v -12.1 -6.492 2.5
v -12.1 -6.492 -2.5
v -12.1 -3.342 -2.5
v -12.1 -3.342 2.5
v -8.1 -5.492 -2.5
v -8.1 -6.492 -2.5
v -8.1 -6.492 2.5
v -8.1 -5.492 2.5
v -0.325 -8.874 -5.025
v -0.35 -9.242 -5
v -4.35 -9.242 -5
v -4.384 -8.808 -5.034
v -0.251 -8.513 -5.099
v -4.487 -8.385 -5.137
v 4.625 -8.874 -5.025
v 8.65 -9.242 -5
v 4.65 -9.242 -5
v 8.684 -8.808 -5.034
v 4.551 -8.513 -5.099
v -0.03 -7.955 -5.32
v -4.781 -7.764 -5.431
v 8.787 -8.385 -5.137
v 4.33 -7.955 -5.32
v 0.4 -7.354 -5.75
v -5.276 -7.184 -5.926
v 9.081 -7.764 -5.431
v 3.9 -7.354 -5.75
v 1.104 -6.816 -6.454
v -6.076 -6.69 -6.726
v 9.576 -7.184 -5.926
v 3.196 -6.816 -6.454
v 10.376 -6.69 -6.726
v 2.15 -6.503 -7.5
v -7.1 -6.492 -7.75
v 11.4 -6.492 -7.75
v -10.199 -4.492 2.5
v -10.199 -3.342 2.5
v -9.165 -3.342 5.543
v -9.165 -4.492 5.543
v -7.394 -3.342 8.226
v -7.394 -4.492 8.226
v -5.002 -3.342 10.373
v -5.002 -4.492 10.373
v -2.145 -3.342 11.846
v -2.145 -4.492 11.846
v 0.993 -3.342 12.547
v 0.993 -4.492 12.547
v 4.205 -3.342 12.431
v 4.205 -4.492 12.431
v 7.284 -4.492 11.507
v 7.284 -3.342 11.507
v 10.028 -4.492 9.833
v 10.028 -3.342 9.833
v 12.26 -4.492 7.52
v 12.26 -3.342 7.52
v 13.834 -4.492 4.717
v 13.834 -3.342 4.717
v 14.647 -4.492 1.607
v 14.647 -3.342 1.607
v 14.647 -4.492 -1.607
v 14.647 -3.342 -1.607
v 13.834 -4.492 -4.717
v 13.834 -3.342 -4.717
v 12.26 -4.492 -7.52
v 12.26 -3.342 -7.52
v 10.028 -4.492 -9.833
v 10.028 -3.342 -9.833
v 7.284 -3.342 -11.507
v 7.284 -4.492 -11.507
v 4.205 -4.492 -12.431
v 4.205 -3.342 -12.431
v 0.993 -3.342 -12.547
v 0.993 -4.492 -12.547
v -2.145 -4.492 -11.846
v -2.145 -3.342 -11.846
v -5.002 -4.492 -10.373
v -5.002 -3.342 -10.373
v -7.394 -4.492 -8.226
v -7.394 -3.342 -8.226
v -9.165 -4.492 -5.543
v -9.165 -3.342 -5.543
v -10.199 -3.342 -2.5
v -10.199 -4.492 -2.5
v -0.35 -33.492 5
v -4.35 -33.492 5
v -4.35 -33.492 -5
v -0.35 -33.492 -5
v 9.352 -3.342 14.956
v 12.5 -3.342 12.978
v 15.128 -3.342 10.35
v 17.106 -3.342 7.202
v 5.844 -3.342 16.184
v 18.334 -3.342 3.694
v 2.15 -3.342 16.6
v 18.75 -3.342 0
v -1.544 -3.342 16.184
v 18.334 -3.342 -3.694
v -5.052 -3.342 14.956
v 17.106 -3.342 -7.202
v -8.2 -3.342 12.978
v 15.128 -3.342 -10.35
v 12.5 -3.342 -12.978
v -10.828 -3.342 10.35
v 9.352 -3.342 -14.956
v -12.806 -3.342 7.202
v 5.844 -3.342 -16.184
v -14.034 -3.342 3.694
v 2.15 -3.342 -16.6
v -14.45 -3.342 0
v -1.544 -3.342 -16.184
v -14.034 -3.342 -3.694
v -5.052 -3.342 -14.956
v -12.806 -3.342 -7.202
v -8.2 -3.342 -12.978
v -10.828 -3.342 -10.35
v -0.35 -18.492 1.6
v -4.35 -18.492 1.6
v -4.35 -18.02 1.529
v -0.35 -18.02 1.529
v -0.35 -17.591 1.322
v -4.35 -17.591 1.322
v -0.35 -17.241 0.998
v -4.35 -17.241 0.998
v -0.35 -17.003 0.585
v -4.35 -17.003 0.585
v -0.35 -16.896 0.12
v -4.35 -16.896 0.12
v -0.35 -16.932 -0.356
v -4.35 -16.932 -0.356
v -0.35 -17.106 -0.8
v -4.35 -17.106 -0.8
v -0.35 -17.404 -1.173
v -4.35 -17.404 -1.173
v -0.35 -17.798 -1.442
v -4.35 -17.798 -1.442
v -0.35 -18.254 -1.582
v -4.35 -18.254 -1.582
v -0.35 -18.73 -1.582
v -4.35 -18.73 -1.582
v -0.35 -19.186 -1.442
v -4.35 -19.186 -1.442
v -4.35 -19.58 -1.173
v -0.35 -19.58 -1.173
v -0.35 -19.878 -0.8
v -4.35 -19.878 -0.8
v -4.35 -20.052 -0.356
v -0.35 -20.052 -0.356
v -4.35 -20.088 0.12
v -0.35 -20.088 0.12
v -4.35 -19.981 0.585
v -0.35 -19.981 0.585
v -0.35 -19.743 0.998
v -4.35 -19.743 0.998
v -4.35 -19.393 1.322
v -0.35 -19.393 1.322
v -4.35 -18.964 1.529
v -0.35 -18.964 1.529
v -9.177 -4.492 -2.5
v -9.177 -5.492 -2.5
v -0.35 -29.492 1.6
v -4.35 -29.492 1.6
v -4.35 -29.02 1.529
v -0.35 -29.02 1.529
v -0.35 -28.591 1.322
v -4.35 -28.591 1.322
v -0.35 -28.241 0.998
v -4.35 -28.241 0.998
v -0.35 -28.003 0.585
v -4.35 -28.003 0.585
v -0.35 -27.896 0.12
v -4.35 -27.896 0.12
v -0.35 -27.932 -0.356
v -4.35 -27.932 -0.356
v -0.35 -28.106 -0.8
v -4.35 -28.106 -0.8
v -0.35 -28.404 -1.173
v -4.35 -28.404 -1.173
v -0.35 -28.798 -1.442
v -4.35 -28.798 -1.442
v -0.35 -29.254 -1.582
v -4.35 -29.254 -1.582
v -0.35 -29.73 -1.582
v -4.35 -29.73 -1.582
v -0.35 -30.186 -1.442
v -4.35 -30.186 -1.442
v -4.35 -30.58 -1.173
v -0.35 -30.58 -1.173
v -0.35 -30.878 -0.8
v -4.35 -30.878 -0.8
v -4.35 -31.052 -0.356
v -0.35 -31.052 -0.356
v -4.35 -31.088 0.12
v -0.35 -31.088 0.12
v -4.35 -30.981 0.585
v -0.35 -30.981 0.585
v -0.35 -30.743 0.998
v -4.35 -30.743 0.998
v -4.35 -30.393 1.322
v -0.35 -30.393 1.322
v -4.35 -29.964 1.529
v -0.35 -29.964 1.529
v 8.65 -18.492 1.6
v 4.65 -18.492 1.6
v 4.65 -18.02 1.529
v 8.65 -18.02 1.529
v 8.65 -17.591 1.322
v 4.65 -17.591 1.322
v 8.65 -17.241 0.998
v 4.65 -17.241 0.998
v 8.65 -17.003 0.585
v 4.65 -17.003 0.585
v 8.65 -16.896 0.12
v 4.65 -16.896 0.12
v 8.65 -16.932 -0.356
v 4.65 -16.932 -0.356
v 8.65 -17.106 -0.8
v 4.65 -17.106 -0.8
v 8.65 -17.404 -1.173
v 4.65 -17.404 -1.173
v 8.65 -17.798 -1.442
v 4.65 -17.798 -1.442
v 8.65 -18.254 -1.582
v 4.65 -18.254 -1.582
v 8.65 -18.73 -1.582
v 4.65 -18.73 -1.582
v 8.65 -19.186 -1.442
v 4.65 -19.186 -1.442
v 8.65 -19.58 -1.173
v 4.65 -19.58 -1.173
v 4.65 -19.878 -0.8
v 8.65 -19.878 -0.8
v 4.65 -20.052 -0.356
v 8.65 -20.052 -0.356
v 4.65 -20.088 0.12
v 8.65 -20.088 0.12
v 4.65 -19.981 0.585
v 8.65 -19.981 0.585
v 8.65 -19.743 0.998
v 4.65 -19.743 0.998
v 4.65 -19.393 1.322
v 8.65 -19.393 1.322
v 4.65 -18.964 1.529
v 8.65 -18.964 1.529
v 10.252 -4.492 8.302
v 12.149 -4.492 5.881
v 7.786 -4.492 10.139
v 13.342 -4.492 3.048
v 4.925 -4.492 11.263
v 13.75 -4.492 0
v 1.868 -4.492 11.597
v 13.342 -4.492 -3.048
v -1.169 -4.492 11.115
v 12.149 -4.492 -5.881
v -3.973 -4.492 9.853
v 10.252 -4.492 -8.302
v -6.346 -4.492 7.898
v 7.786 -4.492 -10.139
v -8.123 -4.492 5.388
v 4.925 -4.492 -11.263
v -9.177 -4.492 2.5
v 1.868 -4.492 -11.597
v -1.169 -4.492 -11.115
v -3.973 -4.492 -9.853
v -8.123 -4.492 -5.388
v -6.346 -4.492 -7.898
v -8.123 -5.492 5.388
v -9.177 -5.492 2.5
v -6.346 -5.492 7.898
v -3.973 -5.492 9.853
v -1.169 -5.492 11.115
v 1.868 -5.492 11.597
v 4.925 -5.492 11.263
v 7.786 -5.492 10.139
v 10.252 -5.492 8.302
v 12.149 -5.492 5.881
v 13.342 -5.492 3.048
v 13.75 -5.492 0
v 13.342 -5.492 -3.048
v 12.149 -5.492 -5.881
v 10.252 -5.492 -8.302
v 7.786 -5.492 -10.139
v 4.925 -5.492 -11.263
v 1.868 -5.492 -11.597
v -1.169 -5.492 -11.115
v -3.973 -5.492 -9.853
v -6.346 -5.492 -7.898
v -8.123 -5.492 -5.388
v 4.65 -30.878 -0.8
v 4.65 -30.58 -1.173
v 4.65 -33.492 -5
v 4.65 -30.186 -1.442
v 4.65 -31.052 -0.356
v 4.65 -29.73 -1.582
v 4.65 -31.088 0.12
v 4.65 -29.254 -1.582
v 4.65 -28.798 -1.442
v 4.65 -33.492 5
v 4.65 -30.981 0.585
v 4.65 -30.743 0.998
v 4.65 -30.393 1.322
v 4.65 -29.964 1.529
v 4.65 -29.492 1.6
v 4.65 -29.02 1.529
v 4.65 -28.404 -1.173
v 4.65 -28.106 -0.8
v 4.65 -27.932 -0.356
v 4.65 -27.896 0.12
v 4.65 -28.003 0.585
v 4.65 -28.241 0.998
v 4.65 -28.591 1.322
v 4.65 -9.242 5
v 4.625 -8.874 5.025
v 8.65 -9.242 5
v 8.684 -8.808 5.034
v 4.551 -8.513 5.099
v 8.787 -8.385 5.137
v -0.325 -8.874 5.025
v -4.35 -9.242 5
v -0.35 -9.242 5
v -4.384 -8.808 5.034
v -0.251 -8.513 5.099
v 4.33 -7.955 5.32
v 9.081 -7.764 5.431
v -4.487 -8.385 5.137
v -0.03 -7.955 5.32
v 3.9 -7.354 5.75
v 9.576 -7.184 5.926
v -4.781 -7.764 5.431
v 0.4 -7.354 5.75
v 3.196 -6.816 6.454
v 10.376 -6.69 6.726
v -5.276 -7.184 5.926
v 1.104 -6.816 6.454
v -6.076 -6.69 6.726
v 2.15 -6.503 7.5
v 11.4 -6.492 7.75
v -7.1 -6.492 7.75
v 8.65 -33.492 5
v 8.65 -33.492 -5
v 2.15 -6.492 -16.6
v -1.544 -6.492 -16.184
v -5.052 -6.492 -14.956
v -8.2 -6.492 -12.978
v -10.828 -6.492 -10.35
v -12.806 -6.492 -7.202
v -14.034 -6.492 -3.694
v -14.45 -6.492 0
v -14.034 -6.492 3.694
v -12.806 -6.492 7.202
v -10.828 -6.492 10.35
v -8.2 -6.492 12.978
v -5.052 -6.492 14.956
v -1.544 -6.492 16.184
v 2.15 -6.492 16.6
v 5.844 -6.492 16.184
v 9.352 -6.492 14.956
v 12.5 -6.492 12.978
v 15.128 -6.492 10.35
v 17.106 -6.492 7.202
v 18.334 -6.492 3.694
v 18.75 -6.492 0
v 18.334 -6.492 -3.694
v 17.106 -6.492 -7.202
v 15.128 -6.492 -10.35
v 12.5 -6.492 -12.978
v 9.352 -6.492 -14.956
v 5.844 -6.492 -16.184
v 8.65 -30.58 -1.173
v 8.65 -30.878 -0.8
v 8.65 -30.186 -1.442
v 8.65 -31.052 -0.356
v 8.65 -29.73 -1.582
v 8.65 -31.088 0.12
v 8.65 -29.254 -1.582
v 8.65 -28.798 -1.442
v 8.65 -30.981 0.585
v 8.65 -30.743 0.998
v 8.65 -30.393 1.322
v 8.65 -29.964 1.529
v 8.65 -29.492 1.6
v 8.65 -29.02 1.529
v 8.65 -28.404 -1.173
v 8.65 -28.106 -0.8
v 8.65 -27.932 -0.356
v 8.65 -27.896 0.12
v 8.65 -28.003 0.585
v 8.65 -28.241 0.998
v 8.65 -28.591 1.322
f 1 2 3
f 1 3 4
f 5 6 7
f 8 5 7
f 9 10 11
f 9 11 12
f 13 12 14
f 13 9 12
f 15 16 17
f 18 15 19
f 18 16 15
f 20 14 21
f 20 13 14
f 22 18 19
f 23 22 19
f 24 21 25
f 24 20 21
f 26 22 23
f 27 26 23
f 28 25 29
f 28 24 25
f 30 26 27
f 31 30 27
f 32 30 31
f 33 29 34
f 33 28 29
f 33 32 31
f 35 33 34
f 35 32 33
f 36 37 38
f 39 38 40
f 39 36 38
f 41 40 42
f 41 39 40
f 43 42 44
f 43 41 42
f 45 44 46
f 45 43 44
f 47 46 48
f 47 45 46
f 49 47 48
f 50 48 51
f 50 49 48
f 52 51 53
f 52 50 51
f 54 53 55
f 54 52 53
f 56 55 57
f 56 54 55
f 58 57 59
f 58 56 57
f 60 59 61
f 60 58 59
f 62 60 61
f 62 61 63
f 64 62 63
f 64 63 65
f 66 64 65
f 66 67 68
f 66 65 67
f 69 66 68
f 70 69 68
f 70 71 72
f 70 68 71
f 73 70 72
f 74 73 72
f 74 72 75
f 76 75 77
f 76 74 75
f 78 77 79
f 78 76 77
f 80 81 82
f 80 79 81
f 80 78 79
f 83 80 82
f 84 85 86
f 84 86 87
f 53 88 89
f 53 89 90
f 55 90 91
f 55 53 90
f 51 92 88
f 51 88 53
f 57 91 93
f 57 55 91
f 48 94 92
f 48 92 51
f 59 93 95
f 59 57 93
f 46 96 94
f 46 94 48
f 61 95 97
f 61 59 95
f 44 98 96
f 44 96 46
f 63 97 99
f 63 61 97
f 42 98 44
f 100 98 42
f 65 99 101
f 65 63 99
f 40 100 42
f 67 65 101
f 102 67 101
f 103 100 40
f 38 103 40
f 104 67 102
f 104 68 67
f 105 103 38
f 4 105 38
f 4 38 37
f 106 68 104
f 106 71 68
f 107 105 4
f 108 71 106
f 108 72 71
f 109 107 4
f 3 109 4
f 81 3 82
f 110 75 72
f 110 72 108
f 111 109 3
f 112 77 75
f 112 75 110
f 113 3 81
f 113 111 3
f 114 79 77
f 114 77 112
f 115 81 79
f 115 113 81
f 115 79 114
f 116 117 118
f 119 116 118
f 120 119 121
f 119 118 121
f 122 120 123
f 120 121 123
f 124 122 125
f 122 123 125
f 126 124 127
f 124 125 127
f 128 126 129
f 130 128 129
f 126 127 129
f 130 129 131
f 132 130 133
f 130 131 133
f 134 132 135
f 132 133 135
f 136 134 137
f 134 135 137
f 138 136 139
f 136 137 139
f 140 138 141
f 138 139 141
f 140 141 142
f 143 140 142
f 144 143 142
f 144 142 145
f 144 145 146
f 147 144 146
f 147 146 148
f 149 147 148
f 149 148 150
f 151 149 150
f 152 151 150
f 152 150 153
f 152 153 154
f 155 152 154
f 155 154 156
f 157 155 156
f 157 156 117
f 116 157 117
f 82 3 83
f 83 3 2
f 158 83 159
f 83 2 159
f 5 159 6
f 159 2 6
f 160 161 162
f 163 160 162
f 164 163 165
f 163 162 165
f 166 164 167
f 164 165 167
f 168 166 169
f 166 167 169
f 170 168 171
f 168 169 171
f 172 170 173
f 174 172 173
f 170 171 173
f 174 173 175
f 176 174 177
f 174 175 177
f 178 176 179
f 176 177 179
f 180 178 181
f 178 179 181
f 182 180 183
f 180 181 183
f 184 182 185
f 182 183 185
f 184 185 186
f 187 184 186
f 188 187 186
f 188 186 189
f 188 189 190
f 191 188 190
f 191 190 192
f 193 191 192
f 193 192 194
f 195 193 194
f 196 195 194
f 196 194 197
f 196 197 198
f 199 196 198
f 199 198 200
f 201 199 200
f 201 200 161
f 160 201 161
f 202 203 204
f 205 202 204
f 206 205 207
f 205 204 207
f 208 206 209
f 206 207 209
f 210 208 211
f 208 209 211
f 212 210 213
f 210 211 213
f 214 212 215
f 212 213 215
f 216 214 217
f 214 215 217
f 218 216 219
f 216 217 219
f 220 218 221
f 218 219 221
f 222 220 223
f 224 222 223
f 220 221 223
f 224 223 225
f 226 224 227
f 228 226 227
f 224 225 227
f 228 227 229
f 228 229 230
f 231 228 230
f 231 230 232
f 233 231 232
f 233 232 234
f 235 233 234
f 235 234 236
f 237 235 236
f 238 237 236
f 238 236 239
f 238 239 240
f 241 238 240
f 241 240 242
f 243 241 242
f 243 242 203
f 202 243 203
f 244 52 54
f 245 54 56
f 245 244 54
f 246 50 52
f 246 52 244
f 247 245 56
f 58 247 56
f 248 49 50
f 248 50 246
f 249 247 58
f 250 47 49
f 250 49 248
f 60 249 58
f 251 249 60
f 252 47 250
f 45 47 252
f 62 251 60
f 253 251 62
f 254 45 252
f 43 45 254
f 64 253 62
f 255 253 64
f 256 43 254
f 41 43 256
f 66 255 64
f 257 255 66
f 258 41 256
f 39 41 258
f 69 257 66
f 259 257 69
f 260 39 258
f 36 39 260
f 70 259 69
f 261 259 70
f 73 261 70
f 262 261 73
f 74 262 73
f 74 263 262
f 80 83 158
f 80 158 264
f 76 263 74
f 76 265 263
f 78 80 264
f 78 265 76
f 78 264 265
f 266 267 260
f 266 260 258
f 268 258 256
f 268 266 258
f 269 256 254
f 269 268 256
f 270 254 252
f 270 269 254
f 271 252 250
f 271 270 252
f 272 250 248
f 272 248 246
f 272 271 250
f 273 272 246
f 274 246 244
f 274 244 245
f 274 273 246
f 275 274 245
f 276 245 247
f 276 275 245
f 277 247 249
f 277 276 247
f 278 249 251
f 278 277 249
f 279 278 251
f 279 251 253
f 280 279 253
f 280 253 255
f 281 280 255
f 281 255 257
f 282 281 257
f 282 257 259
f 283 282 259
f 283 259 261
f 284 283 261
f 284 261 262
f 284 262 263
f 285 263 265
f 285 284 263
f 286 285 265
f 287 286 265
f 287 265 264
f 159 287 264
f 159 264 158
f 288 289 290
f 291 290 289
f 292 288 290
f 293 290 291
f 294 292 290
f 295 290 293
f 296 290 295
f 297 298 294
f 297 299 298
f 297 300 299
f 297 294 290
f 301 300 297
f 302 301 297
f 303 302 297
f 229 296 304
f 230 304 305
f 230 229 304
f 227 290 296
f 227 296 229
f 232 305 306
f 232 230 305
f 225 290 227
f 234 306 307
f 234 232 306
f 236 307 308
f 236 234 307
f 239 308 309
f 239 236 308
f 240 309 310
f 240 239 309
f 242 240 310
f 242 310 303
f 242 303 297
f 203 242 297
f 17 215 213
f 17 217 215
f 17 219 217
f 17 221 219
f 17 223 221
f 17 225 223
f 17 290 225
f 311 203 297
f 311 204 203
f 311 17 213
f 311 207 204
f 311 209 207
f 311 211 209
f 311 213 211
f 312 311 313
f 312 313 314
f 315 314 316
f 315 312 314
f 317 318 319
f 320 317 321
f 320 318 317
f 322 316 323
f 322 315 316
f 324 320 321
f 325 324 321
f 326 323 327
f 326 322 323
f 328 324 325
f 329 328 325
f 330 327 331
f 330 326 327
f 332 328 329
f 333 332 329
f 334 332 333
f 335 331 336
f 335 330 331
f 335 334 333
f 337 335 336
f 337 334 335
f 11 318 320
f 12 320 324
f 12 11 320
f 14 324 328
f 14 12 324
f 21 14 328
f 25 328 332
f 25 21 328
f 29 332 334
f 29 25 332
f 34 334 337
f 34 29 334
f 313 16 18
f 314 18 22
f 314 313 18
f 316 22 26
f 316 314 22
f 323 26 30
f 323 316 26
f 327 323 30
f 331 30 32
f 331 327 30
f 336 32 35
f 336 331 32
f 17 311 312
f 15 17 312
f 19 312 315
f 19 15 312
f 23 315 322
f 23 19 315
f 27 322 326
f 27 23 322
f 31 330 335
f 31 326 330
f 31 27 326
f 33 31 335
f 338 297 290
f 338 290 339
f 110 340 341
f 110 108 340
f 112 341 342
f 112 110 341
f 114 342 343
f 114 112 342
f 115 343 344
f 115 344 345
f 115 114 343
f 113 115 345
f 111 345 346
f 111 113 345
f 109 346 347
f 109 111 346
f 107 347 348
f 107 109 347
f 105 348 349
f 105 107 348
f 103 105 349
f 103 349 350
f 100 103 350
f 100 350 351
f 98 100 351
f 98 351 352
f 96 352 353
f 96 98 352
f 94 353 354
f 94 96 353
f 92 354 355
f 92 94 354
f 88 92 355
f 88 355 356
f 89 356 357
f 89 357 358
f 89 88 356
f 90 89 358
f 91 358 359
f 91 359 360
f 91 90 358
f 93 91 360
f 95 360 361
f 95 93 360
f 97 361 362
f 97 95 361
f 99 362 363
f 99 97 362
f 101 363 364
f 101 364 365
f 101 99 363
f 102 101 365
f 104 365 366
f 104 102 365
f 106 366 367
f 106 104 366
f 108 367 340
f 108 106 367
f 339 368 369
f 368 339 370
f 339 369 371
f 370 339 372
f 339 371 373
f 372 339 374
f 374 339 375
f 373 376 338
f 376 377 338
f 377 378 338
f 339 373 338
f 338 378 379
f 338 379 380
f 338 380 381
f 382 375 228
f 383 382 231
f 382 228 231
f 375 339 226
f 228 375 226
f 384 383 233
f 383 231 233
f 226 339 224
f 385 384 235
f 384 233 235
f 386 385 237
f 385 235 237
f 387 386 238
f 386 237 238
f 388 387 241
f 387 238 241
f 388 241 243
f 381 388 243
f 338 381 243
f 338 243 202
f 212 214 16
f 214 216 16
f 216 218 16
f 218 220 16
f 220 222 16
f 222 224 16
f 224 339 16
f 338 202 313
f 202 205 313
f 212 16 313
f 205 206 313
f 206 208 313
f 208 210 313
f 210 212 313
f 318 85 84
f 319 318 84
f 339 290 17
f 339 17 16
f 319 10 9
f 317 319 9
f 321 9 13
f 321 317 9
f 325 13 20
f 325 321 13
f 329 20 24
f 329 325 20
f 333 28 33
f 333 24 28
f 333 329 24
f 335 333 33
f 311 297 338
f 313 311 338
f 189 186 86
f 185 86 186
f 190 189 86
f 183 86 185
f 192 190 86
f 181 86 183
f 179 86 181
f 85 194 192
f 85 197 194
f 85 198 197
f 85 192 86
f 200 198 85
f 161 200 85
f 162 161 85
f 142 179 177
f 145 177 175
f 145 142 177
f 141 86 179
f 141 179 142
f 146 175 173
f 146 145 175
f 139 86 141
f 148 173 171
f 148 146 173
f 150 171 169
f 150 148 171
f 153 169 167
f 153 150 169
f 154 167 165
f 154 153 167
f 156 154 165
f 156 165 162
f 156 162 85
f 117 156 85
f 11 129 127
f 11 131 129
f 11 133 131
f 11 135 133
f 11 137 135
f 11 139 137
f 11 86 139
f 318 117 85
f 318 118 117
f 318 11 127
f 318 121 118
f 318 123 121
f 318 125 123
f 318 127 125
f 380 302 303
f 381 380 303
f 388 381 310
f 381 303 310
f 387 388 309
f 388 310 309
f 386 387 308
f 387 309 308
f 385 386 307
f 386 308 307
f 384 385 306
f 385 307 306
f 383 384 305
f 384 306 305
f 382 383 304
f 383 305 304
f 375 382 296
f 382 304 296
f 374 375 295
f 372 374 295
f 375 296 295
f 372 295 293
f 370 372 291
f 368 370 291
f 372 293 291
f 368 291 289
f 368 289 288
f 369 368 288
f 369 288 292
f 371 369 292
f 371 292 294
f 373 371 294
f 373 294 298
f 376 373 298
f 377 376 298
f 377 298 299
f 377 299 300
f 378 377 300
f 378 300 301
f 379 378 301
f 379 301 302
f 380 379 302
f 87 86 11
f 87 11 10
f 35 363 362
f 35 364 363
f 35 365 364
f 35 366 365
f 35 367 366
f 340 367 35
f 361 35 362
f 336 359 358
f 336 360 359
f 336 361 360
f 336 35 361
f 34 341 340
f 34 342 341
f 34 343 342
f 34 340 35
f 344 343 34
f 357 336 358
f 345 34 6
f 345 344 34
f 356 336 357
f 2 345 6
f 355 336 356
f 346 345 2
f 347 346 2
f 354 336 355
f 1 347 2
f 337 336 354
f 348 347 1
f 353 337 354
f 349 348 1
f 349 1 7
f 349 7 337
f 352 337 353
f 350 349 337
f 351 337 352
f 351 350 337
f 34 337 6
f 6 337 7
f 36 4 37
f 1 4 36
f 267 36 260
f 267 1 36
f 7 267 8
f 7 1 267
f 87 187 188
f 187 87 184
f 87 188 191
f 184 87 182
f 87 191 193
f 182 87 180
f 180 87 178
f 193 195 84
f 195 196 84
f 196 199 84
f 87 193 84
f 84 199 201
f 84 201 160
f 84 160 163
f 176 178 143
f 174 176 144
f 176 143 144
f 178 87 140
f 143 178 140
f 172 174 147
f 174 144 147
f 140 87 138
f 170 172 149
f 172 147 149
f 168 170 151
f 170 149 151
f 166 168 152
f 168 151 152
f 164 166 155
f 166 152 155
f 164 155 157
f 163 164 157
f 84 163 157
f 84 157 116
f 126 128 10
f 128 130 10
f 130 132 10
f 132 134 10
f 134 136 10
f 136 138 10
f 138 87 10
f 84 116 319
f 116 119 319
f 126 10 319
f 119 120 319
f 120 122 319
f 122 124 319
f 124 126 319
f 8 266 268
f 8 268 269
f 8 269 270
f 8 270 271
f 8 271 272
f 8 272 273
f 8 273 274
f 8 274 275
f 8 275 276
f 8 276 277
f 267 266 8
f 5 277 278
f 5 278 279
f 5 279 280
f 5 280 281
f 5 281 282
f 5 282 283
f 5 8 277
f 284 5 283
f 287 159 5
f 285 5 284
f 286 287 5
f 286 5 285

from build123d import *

# Parameters (mm, degrees)
SKETCH2_W           = 4
SKETCH2_H           = 10
BOSS_EXTRUDE1_DEPTH = 27
SKETCH3_R           = 1.6
CUT_EXTRUDE1_DEPTH  = 22.3
FILLET1_R           = 2.75
SKETCH6_W           = 4
SKETCH6_H           = 5
CUT_EXTRUDE4_DEPTH  = 10


with BuildPart() as part:
    # Sketch1 → Revolve1 (revolve)
    with BuildSketch(Plane.XY, mode=Mode.PRIVATE) as revolve1_sk:
        Polygon((-14.45, -3.342), (-10.45, -3.342), (-10.45, -4.492), (-9.45, -4.492), (-9.45, -5.492), (2.15, -5.492), (2.15, -6.492), (-14.45, -6.492), align=None)
    revolve(revolve1_sk.sketch.rotate(Axis((2.15, -6.492, 0), (0, 1, 0)), 270), axis=Axis((2.15, -6.492, 0), (0, 1, 0)))

    # Sketch2 → Boss-Extrude1 (add)
    with BuildSketch(Plane.XZ.offset(6.492)):
        with Locations((6.65, 0)):
            Rectangle(SKETCH2_W, SKETCH2_H)
        with Locations((-2.35, 0)):
            Rectangle(SKETCH2_W, SKETCH2_H)
    extrude(amount=BOSS_EXTRUDE1_DEPTH)

    # Sketch3 → Cut-Extrude1 (cut)
    with BuildSketch(Plane.ZY.offset(4.35)):
        with Locations((0, -29.492)):
            Circle(SKETCH3_R)
        with Locations((0, -18.492)):
            Circle(SKETCH3_R)
    extrude(amount=-CUT_EXTRUDE1_DEPTH, mode=Mode.SUBTRACT)

    # Fillet1
    # the kernel refuses this fillet: 2.75 mm, written as the material it adds along each edge
    with BuildSketch(Plane(origin=(-4.35, -6.492, -5), x_dir=(-1, 0, 0), z_dir=(0, 0, 1)), Plane(origin=(-0.35, -6.492, 5), x_dir=(1, 0, 0), z_dir=(0, 0, -1)), Plane(origin=(8.65, -6.492, 5), x_dir=(1, 0, 0), z_dir=(0, 0, -1)), Plane(origin=(4.65, -6.492, -5), x_dir=(-1, 0, 0), z_dir=(0, 0, 1))) as fillet1_piece_1:
        with BuildLine():
            CenterArc((FILLET1_R, FILLET1_R), FILLET1_R, 180, 90)
            Line((0, FILLET1_R), (0, 0))
            Line((0, 0), (FILLET1_R, 0))
        make_face()
    extrude(amount=10)
    with BuildSketch(Plane(origin=(6.525, -6.492, -5), x_dir=(0, 0, -1), z_dir=(-1, 0, 0))) as fillet1_piece_2_section:
        with BuildLine():
            CenterArc((FILLET1_R, FILLET1_R), FILLET1_R, 180, 90)
            Line((0, FILLET1_R), (0, 0))
            Line((0, 0), (FILLET1_R, 0))
        make_face()
    fillet1_piece_2 = extrude(amount=10.875, mode=Mode.PRIVATE)
    fillet1_piece_2 = split(fillet1_piece_2, bisect_by=Plane(origin=(4.65, -7.114586564, -5.622586564), z_dir=(1, 0, 0)), keep=Keep.TOP, mode=Mode.PRIVATE)
    add(fillet1_piece_2)
    with BuildSketch(Plane(origin=(-0.35, -6.492, -5), x_dir=(0, 0, -1), z_dir=(-1, 0, 0)), Plane(origin=(-4.35, -6.492, 5), x_dir=(0, 0, 1), z_dir=(1, 0, 0)), Plane(origin=(4.65, -6.492, 5), x_dir=(0, 0, 1), z_dir=(1, 0, 0)), Plane(origin=(8.65, -6.492, -5), x_dir=(0, 0, -1), z_dir=(-1, 0, 0))) as fillet1_piece_3:
        with BuildLine():
            CenterArc((FILLET1_R, FILLET1_R), FILLET1_R, 180, 90)
            Line((0, FILLET1_R), (0, 0))
            Line((0, 0), (FILLET1_R, 0))
        make_face()
    extrude(amount=4)
    with BuildSketch(Plane(origin=(-4.35, -6.492, 5), x_dir=(0, 0, 1), z_dir=(1, 0, 0))) as fillet1_piece_4_section:
        with BuildLine():
            CenterArc((FILLET1_R, FILLET1_R), FILLET1_R, 180, 90)
            Line((0, FILLET1_R), (0, 0))
            Line((0, 0), (FILLET1_R, 0))
        make_face()
    fillet1_piece_4 = extrude(amount=10.875, mode=Mode.PRIVATE)
    fillet1_piece_4 = split(fillet1_piece_4, bisect_by=Plane(origin=(4.65, -7.114586564, 5.622586564), z_dir=(1, 0, 0)), keep=Keep.TOP, mode=Mode.PRIVATE)
    add(fillet1_piece_4)
    with BuildSketch(Plane(origin=(-2.225, -6.492, 5), x_dir=(0, 0, 1), z_dir=(1, 0, 0))) as fillet1_piece_5_section:
        with BuildLine():
            CenterArc((FILLET1_R, FILLET1_R), FILLET1_R, 180, 90)
            Line((0, FILLET1_R), (0, 0))
            Line((0, 0), (FILLET1_R, 0))
        make_face()
    fillet1_piece_5 = extrude(amount=10.875, mode=Mode.PRIVATE)
    fillet1_piece_5 = split(fillet1_piece_5, bisect_by=Plane(origin=(-0.35, -7.114586564, 5.622586564), z_dir=(-1, 0, 0)), keep=Keep.TOP, mode=Mode.PRIVATE)
    add(fillet1_piece_5)
    with BuildSketch(Plane(origin=(8.65, -6.492, -5), x_dir=(0, 0, -1), z_dir=(-1, 0, 0))) as fillet1_piece_6_section:
        with BuildLine():
            CenterArc((FILLET1_R, FILLET1_R), FILLET1_R, 180, 90)
            Line((0, FILLET1_R), (0, 0))
            Line((0, 0), (FILLET1_R, 0))
        make_face()
    fillet1_piece_6 = extrude(amount=10.875, mode=Mode.PRIVATE)
    fillet1_piece_6 = split(fillet1_piece_6, bisect_by=Plane(origin=(-0.35, -7.114586564, -5.622586564), z_dir=(-1, 0, 0)), keep=Keep.TOP, mode=Mode.PRIVATE)
    add(fillet1_piece_6)
    with BuildSketch(Plane(origin=(-4.35, -6.492, -11.875), x_dir=(-1, 0, 0), z_dir=(0, 0, 1))) as fillet1_piece_7a_section:
        with BuildLine():
            CenterArc((FILLET1_R, FILLET1_R), FILLET1_R, 180, 90)
            Line((0, FILLET1_R), (0, 0))
            Line((0, 0), (FILLET1_R, 0))
        make_face()
    fillet1_piece_7a = extrude(amount=16.875, mode=Mode.PRIVATE)
    fillet1_piece_7a = split(fillet1_piece_7a, bisect_by=Plane(origin=(-4.972586564, -7.114586564, -5), z_dir=(0, 0, -1)), keep=Keep.TOP, mode=Mode.PRIVATE)
    with BuildSketch(Plane(origin=(-0.35, -6.492, -5), x_dir=(0, 0, -1), z_dir=(-1, 0, 0))) as fillet1_piece_7b_section:
        with BuildLine():
            CenterArc((FILLET1_R, FILLET1_R), FILLET1_R, 180, 90)
            Line((0, FILLET1_R), (0, 0))
            Line((0, 0), (FILLET1_R, 0))
        make_face()
    fillet1_piece_7b = extrude(amount=10.875, mode=Mode.PRIVATE)
    fillet1_piece_7b = split(fillet1_piece_7b, bisect_by=Plane(origin=(-4.35, -7.114586564, -5.622586564), z_dir=(-1, 0, 0)), keep=Keep.TOP, mode=Mode.PRIVATE)
    fillet1_piece_7 = fillet1_piece_7a & fillet1_piece_7b
    add(fillet1_piece_7)
    with BuildSketch(Plane(origin=(-4.35, -6.492, -5), x_dir=(-1, 0, 0), z_dir=(0, 0, 1))) as fillet1_piece_8a_section:
        with BuildLine():
            CenterArc((FILLET1_R, FILLET1_R), FILLET1_R, 180, 90)
            Line((0, FILLET1_R), (0, 0))
            Line((0, 0), (FILLET1_R, 0))
        make_face()
    fillet1_piece_8a = extrude(amount=16.875, mode=Mode.PRIVATE)
    fillet1_piece_8a = split(fillet1_piece_8a, bisect_by=Plane(origin=(-4.972586564, -7.114586564, 5), z_dir=(0, 0, 1)), keep=Keep.TOP, mode=Mode.PRIVATE)
    with BuildSketch(Plane(origin=(-11.225, -6.492, 5), x_dir=(0, 0, 1), z_dir=(1, 0, 0))) as fillet1_piece_8b_section:
        with BuildLine():
            CenterArc((FILLET1_R, FILLET1_R), FILLET1_R, 180, 90)
            Line((0, FILLET1_R), (0, 0))
            Line((0, 0), (FILLET1_R, 0))
        make_face()
    fillet1_piece_8b = extrude(amount=10.875, mode=Mode.PRIVATE)
    fillet1_piece_8b = split(fillet1_piece_8b, bisect_by=Plane(origin=(-4.35, -7.114586564, 5.622586564), z_dir=(-1, 0, 0)), keep=Keep.TOP, mode=Mode.PRIVATE)
    fillet1_piece_8 = fillet1_piece_8a & fillet1_piece_8b
    add(fillet1_piece_8)
    with BuildSketch(Plane(origin=(6.525, -6.492, -5), x_dir=(0, 0, -1), z_dir=(-1, 0, 0))) as fillet1_piece_9a_section:
        with BuildLine():
            CenterArc((FILLET1_R, FILLET1_R), FILLET1_R, 180, 90)
            Line((0, FILLET1_R), (0, 0))
            Line((0, 0), (FILLET1_R, 0))
        make_face()
    fillet1_piece_9a = extrude(amount=10.875, mode=Mode.PRIVATE)
    fillet1_piece_9a = split(fillet1_piece_9a, bisect_by=Plane(origin=(4.65, -7.114586564, -5.622586564), z_dir=(-1, 0, 0)), keep=Keep.TOP, mode=Mode.PRIVATE)
    fillet1_piece_9a = split(fillet1_piece_9a, bisect_by=Plane(origin=(-0.35, -7.114586564, -5.622586564), z_dir=(1, 0, 0)), keep=Keep.TOP, mode=Mode.PRIVATE)
    with BuildSketch(Plane(origin=(-0.35, -6.492, 5), x_dir=(1, 0, 0), z_dir=(0, 0, -1))) as fillet1_piece_9b_section:
        with BuildLine():
            CenterArc((FILLET1_R, FILLET1_R), FILLET1_R, 180, 90)
            Line((0, FILLET1_R), (0, 0))
            Line((0, 0), (FILLET1_R, 0))
        make_face()
    fillet1_piece_9b = extrude(amount=16.875, mode=Mode.PRIVATE)
    fillet1_piece_9b = split(fillet1_piece_9b, bisect_by=Plane(origin=(0.272586564, -7.114586564, -5), z_dir=(0, 0, -1)), keep=Keep.TOP, mode=Mode.PRIVATE)
    fillet1_piece_9 = fillet1_piece_9a & fillet1_piece_9b
    add(fillet1_piece_9)
    with BuildSketch(Plane(origin=(-0.35, -6.492, 11.875), x_dir=(1, 0, 0), z_dir=(0, 0, -1))) as fillet1_piece_10a_section:
        with BuildLine():
            CenterArc((FILLET1_R, FILLET1_R), FILLET1_R, 180, 90)
            Line((0, FILLET1_R), (0, 0))
            Line((0, 0), (FILLET1_R, 0))
        make_face()
    fillet1_piece_10a = extrude(amount=16.875, mode=Mode.PRIVATE)
    fillet1_piece_10a = split(fillet1_piece_10a, bisect_by=Plane(origin=(0.272586564, -7.114586564, 5), z_dir=(0, 0, 1)), keep=Keep.TOP, mode=Mode.PRIVATE)
    with BuildSketch(Plane(origin=(-4.35, -6.492, 5), x_dir=(0, 0, 1), z_dir=(1, 0, 0))) as fillet1_piece_10b_section:
        with BuildLine():
            CenterArc((FILLET1_R, FILLET1_R), FILLET1_R, 180, 90)
            Line((0, FILLET1_R), (0, 0))
            Line((0, 0), (FILLET1_R, 0))
        make_face()
    fillet1_piece_10b = extrude(amount=10.875, mode=Mode.PRIVATE)
    fillet1_piece_10b = split(fillet1_piece_10b, bisect_by=Plane(origin=(4.65, -7.114586564, 5.622586564), z_dir=(-1, 0, 0)), keep=Keep.TOP, mode=Mode.PRIVATE)
    fillet1_piece_10b = split(fillet1_piece_10b, bisect_by=Plane(origin=(-0.35, -7.114586564, 5.622586564), z_dir=(1, 0, 0)), keep=Keep.TOP, mode=Mode.PRIVATE)
    fillet1_piece_10 = fillet1_piece_10a & fillet1_piece_10b
    add(fillet1_piece_10)
    with BuildSketch(Plane(origin=(8.65, -6.492, 11.875), x_dir=(1, 0, 0), z_dir=(0, 0, -1))) as fillet1_piece_11a_section:
        with BuildLine():
            CenterArc((FILLET1_R, FILLET1_R), FILLET1_R, 180, 90)
            Line((0, FILLET1_R), (0, 0))
            Line((0, 0), (FILLET1_R, 0))
        make_face()
    fillet1_piece_11a = extrude(amount=16.875, mode=Mode.PRIVATE)
    fillet1_piece_11a = split(fillet1_piece_11a, bisect_by=Plane(origin=(9.272586564, -7.114586564, 5), z_dir=(0, 0, 1)), keep=Keep.TOP, mode=Mode.PRIVATE)
    with BuildSketch(Plane(origin=(4.65, -6.492, 5), x_dir=(0, 0, 1), z_dir=(1, 0, 0))) as fillet1_piece_11b_section:
        with BuildLine():
            CenterArc((FILLET1_R, FILLET1_R), FILLET1_R, 180, 90)
            Line((0, FILLET1_R), (0, 0))
            Line((0, 0), (FILLET1_R, 0))
        make_face()
    fillet1_piece_11b = extrude(amount=10.875, mode=Mode.PRIVATE)
    fillet1_piece_11b = split(fillet1_piece_11b, bisect_by=Plane(origin=(8.65, -7.114586564, 5.622586564), z_dir=(1, 0, 0)), keep=Keep.TOP, mode=Mode.PRIVATE)
    fillet1_piece_11 = fillet1_piece_11a & fillet1_piece_11b
    add(fillet1_piece_11)
    with BuildSketch(Plane(origin=(8.65, -6.492, 5), x_dir=(1, 0, 0), z_dir=(0, 0, -1))) as fillet1_piece_12a_section:
        with BuildLine():
            CenterArc((FILLET1_R, FILLET1_R), FILLET1_R, 180, 90)
            Line((0, FILLET1_R), (0, 0))
            Line((0, 0), (FILLET1_R, 0))
        make_face()
    fillet1_piece_12a = extrude(amount=16.875, mode=Mode.PRIVATE)
    fillet1_piece_12a = split(fillet1_piece_12a, bisect_by=Plane(origin=(9.272586564, -7.114586564, -5), z_dir=(0, 0, -1)), keep=Keep.TOP, mode=Mode.PRIVATE)
    with BuildSketch(Plane(origin=(15.525, -6.492, -5), x_dir=(0, 0, -1), z_dir=(-1, 0, 0))) as fillet1_piece_12b_section:
        with BuildLine():
            CenterArc((FILLET1_R, FILLET1_R), FILLET1_R, 180, 90)
            Line((0, FILLET1_R), (0, 0))
            Line((0, 0), (FILLET1_R, 0))
        make_face()
    fillet1_piece_12b = extrude(amount=10.875, mode=Mode.PRIVATE)
    fillet1_piece_12b = split(fillet1_piece_12b, bisect_by=Plane(origin=(8.65, -7.114586564, -5.622586564), z_dir=(1, 0, 0)), keep=Keep.TOP, mode=Mode.PRIVATE)
    fillet1_piece_12 = fillet1_piece_12a & fillet1_piece_12b
    add(fillet1_piece_12)
    with BuildSketch(Plane(origin=(-2.225, -6.492, 5), x_dir=(0, 0, 1), z_dir=(1, 0, 0))) as fillet1_piece_13a_section:
        with BuildLine():
            CenterArc((FILLET1_R, FILLET1_R), FILLET1_R, 180, 90)
            Line((0, FILLET1_R), (0, 0))
            Line((0, 0), (FILLET1_R, 0))
        make_face()
    fillet1_piece_13a = extrude(amount=10.875, mode=Mode.PRIVATE)
    fillet1_piece_13a = split(fillet1_piece_13a, bisect_by=Plane(origin=(4.65, -7.114586564, 5.622586564), z_dir=(-1, 0, 0)), keep=Keep.TOP, mode=Mode.PRIVATE)
    fillet1_piece_13a = split(fillet1_piece_13a, bisect_by=Plane(origin=(-0.35, -7.114586564, 5.622586564), z_dir=(1, 0, 0)), keep=Keep.TOP, mode=Mode.PRIVATE)
    with BuildSketch(Plane(origin=(4.65, -6.492, -5), x_dir=(-1, 0, 0), z_dir=(0, 0, 1))) as fillet1_piece_13b_section:
        with BuildLine():
            CenterArc((FILLET1_R, FILLET1_R), FILLET1_R, 180, 90)
            Line((0, FILLET1_R), (0, 0))
            Line((0, 0), (FILLET1_R, 0))
        make_face()
    fillet1_piece_13b = extrude(amount=16.875, mode=Mode.PRIVATE)
    fillet1_piece_13b = split(fillet1_piece_13b, bisect_by=Plane(origin=(4.027413436, -7.114586564, 5), z_dir=(0, 0, 1)), keep=Keep.TOP, mode=Mode.PRIVATE)
    fillet1_piece_13 = fillet1_piece_13a & fillet1_piece_13b
    add(fillet1_piece_13)
    with BuildSketch(Plane(origin=(4.65, -6.492, -11.875), x_dir=(-1, 0, 0), z_dir=(0, 0, 1))) as fillet1_piece_14a_section:
        with BuildLine():
            CenterArc((FILLET1_R, FILLET1_R), FILLET1_R, 180, 90)
            Line((0, FILLET1_R), (0, 0))
            Line((0, 0), (FILLET1_R, 0))
        make_face()
    fillet1_piece_14a = extrude(amount=16.875, mode=Mode.PRIVATE)
    fillet1_piece_14a = split(fillet1_piece_14a, bisect_by=Plane(origin=(4.027413436, -7.114586564, -5), z_dir=(0, 0, -1)), keep=Keep.TOP, mode=Mode.PRIVATE)
    with BuildSketch(Plane(origin=(8.65, -6.492, -5), x_dir=(0, 0, -1), z_dir=(-1, 0, 0))) as fillet1_piece_14b_section:
        with BuildLine():
            CenterArc((FILLET1_R, FILLET1_R), FILLET1_R, 180, 90)
            Line((0, FILLET1_R), (0, 0))
            Line((0, 0), (FILLET1_R, 0))
        make_face()
    fillet1_piece_14b = extrude(amount=10.875, mode=Mode.PRIVATE)
    fillet1_piece_14b = split(fillet1_piece_14b, bisect_by=Plane(origin=(4.65, -7.114586564, -5.622586564), z_dir=(-1, 0, 0)), keep=Keep.TOP, mode=Mode.PRIVATE)
    fillet1_piece_14b = split(fillet1_piece_14b, bisect_by=Plane(origin=(-0.35, -7.114586564, -5.622586564), z_dir=(1, 0, 0)), keep=Keep.TOP, mode=Mode.PRIVATE)
    fillet1_piece_14 = fillet1_piece_14a & fillet1_piece_14b
    add(fillet1_piece_14)

    # Sketch6 → Cut-Extrude4 (cut)
    with BuildSketch(Plane.XZ.offset(6.492)):
        with Locations((-10.1, 0)):
            Rectangle(SKETCH6_W, SKETCH6_H)
    extrude(amount=-CUT_EXTRUDE4_DEPTH, mode=Mode.SUBTRACT)


solid = part.part
